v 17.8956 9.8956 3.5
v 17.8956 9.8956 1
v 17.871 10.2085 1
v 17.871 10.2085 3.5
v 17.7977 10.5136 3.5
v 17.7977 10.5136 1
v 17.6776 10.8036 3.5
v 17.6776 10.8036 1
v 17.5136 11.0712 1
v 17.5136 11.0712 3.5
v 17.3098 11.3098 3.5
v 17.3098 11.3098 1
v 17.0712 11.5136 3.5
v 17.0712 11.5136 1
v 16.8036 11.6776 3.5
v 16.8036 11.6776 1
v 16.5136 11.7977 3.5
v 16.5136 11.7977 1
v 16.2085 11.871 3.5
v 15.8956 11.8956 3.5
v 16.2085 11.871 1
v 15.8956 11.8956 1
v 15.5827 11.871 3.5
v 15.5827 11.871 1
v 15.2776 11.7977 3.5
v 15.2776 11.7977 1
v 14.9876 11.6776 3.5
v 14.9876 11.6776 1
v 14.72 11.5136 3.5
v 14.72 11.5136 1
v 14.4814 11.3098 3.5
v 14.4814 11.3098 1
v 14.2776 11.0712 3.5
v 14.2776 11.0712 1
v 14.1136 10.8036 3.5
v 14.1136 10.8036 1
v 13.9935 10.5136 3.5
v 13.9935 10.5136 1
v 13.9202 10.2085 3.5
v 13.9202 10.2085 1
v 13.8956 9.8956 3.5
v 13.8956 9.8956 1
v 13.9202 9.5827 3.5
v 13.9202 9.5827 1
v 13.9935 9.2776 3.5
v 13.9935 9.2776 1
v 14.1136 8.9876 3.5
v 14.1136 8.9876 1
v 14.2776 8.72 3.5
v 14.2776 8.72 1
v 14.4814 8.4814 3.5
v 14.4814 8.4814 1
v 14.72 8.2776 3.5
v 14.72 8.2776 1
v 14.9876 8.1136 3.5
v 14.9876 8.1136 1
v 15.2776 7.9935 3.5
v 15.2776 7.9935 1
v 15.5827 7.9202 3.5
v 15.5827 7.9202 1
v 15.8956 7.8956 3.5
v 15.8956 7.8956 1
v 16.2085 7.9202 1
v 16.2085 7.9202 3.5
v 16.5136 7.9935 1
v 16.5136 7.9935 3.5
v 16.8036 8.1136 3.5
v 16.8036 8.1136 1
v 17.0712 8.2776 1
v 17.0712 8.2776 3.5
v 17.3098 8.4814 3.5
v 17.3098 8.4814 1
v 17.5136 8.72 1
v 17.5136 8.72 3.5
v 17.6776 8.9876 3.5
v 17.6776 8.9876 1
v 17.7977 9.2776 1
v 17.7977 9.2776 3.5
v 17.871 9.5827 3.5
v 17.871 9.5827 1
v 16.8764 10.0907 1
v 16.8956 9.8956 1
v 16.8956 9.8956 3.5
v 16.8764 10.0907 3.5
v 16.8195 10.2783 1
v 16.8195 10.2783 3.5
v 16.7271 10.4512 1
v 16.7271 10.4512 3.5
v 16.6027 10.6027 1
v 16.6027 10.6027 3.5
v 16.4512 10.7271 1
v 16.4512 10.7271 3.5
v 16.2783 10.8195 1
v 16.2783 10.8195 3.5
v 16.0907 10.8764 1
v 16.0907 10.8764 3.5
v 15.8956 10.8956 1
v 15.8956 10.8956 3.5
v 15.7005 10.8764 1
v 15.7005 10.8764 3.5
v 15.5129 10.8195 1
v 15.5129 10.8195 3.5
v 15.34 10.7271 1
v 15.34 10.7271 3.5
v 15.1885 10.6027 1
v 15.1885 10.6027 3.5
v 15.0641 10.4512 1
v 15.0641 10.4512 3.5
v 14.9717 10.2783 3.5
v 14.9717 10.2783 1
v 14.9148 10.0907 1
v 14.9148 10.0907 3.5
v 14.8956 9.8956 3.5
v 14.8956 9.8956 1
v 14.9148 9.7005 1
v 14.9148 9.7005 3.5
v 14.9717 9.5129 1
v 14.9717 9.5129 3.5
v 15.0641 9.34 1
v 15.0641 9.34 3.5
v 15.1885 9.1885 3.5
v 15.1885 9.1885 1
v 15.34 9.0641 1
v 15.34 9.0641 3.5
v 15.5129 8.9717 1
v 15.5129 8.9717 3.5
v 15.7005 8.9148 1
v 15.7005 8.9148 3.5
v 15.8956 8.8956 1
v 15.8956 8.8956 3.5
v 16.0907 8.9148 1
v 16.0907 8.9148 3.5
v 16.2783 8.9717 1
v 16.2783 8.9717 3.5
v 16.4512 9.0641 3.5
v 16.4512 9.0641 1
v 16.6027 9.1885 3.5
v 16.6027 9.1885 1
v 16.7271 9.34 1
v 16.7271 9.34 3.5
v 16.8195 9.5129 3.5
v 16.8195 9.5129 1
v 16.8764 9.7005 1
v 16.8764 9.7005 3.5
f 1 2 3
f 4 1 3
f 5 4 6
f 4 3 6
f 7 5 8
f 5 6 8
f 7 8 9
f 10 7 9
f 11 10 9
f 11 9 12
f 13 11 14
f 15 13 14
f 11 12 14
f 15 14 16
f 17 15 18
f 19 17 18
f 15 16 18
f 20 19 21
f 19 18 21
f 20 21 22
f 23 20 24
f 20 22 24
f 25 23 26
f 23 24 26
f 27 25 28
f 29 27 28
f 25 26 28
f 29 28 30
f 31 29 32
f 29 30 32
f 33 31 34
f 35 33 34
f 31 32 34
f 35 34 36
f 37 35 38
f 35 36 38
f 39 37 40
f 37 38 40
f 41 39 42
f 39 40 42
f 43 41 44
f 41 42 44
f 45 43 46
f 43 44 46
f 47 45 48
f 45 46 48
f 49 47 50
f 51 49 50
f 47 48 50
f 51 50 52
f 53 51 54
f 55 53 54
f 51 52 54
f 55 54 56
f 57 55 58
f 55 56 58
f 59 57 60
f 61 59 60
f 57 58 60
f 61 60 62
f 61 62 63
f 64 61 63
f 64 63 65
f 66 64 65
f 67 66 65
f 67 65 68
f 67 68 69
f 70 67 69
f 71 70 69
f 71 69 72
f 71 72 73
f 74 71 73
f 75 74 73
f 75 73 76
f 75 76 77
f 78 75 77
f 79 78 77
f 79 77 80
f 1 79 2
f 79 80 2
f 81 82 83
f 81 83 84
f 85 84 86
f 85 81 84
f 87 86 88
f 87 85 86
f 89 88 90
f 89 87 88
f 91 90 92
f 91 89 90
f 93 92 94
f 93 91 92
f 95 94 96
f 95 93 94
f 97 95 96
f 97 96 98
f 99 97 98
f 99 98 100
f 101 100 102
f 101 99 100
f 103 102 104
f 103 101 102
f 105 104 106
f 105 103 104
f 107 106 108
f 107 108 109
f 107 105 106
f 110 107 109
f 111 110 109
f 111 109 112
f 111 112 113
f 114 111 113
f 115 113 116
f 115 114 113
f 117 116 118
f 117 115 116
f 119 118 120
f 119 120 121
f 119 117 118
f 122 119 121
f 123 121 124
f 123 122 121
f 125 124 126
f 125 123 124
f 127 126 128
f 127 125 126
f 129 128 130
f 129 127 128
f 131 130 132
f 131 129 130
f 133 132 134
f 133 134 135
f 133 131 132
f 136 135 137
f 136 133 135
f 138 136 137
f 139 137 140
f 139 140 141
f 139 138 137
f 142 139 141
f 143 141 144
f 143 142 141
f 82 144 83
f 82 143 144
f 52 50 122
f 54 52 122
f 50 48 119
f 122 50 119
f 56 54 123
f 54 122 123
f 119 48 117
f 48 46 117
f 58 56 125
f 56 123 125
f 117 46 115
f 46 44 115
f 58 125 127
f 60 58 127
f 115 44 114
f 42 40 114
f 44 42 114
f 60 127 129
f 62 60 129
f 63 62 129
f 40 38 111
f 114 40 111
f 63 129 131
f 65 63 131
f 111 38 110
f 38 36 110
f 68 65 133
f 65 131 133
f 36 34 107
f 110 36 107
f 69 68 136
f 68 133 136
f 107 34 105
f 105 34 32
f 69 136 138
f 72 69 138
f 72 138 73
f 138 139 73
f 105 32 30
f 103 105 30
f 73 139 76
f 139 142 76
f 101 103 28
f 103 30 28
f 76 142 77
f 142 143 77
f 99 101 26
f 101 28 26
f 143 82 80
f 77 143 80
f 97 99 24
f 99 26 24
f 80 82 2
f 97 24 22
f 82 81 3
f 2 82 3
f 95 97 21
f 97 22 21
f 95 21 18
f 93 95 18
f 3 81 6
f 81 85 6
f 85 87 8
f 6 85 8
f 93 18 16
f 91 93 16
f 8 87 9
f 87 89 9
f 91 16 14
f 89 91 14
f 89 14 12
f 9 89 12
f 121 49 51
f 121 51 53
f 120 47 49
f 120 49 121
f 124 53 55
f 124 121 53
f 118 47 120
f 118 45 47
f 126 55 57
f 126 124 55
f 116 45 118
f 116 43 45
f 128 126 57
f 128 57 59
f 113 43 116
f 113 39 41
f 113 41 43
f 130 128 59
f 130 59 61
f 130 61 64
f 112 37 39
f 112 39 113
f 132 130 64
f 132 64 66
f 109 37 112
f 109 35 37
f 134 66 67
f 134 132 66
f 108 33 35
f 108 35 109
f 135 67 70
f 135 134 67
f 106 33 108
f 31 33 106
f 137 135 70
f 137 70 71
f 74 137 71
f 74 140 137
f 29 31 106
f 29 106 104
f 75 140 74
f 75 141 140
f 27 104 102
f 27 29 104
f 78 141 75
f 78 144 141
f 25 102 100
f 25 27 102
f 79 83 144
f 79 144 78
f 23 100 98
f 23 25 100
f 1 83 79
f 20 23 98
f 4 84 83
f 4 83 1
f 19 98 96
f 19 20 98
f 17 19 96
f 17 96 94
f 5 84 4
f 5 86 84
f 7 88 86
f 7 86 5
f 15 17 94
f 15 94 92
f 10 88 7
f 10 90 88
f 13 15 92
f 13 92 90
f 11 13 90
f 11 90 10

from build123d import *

# Parameters (mm, degrees)
CYLINDER032_R     = 1
CYLINDER032_DEPTH = 2.5
CYLINDER031_R     = 2
CYLINDER031_DEPTH = 2.5


with BuildPart() as hole_pcb_master007:
    # Cylinder032 → Cylinder032 (new body)
    with BuildSketch(Plane(origin=(15.8956, 9.8956, 0), x_dir=(1, 0, 0), z_dir=(0, 0, 1))):
        Circle(CYLINDER032_R)
    extrude(amount=CYLINDER032_DEPTH)


with BuildPart() as pcb_support:
    # Cylinder031 → Cylinder031 (new body)
    with BuildSketch(Plane(origin=(15.8956, 9.8956, 0), x_dir=(1, 0, 0), z_dir=(0, 0, 1))):
        Circle(CYLINDER031_R)
    extrude(amount=CYLINDER031_DEPTH)

    # Cut031: cut hole_PCB_master007
    add(hole_pcb_master007.part, mode=Mode.SUBTRACT)


with BuildPart() as pcb_support_1:
    # Cut031 placement: moved
    add(pcb_support.part.moved(Location((0, 0, 1))))


solid = pcb_support_1.part
